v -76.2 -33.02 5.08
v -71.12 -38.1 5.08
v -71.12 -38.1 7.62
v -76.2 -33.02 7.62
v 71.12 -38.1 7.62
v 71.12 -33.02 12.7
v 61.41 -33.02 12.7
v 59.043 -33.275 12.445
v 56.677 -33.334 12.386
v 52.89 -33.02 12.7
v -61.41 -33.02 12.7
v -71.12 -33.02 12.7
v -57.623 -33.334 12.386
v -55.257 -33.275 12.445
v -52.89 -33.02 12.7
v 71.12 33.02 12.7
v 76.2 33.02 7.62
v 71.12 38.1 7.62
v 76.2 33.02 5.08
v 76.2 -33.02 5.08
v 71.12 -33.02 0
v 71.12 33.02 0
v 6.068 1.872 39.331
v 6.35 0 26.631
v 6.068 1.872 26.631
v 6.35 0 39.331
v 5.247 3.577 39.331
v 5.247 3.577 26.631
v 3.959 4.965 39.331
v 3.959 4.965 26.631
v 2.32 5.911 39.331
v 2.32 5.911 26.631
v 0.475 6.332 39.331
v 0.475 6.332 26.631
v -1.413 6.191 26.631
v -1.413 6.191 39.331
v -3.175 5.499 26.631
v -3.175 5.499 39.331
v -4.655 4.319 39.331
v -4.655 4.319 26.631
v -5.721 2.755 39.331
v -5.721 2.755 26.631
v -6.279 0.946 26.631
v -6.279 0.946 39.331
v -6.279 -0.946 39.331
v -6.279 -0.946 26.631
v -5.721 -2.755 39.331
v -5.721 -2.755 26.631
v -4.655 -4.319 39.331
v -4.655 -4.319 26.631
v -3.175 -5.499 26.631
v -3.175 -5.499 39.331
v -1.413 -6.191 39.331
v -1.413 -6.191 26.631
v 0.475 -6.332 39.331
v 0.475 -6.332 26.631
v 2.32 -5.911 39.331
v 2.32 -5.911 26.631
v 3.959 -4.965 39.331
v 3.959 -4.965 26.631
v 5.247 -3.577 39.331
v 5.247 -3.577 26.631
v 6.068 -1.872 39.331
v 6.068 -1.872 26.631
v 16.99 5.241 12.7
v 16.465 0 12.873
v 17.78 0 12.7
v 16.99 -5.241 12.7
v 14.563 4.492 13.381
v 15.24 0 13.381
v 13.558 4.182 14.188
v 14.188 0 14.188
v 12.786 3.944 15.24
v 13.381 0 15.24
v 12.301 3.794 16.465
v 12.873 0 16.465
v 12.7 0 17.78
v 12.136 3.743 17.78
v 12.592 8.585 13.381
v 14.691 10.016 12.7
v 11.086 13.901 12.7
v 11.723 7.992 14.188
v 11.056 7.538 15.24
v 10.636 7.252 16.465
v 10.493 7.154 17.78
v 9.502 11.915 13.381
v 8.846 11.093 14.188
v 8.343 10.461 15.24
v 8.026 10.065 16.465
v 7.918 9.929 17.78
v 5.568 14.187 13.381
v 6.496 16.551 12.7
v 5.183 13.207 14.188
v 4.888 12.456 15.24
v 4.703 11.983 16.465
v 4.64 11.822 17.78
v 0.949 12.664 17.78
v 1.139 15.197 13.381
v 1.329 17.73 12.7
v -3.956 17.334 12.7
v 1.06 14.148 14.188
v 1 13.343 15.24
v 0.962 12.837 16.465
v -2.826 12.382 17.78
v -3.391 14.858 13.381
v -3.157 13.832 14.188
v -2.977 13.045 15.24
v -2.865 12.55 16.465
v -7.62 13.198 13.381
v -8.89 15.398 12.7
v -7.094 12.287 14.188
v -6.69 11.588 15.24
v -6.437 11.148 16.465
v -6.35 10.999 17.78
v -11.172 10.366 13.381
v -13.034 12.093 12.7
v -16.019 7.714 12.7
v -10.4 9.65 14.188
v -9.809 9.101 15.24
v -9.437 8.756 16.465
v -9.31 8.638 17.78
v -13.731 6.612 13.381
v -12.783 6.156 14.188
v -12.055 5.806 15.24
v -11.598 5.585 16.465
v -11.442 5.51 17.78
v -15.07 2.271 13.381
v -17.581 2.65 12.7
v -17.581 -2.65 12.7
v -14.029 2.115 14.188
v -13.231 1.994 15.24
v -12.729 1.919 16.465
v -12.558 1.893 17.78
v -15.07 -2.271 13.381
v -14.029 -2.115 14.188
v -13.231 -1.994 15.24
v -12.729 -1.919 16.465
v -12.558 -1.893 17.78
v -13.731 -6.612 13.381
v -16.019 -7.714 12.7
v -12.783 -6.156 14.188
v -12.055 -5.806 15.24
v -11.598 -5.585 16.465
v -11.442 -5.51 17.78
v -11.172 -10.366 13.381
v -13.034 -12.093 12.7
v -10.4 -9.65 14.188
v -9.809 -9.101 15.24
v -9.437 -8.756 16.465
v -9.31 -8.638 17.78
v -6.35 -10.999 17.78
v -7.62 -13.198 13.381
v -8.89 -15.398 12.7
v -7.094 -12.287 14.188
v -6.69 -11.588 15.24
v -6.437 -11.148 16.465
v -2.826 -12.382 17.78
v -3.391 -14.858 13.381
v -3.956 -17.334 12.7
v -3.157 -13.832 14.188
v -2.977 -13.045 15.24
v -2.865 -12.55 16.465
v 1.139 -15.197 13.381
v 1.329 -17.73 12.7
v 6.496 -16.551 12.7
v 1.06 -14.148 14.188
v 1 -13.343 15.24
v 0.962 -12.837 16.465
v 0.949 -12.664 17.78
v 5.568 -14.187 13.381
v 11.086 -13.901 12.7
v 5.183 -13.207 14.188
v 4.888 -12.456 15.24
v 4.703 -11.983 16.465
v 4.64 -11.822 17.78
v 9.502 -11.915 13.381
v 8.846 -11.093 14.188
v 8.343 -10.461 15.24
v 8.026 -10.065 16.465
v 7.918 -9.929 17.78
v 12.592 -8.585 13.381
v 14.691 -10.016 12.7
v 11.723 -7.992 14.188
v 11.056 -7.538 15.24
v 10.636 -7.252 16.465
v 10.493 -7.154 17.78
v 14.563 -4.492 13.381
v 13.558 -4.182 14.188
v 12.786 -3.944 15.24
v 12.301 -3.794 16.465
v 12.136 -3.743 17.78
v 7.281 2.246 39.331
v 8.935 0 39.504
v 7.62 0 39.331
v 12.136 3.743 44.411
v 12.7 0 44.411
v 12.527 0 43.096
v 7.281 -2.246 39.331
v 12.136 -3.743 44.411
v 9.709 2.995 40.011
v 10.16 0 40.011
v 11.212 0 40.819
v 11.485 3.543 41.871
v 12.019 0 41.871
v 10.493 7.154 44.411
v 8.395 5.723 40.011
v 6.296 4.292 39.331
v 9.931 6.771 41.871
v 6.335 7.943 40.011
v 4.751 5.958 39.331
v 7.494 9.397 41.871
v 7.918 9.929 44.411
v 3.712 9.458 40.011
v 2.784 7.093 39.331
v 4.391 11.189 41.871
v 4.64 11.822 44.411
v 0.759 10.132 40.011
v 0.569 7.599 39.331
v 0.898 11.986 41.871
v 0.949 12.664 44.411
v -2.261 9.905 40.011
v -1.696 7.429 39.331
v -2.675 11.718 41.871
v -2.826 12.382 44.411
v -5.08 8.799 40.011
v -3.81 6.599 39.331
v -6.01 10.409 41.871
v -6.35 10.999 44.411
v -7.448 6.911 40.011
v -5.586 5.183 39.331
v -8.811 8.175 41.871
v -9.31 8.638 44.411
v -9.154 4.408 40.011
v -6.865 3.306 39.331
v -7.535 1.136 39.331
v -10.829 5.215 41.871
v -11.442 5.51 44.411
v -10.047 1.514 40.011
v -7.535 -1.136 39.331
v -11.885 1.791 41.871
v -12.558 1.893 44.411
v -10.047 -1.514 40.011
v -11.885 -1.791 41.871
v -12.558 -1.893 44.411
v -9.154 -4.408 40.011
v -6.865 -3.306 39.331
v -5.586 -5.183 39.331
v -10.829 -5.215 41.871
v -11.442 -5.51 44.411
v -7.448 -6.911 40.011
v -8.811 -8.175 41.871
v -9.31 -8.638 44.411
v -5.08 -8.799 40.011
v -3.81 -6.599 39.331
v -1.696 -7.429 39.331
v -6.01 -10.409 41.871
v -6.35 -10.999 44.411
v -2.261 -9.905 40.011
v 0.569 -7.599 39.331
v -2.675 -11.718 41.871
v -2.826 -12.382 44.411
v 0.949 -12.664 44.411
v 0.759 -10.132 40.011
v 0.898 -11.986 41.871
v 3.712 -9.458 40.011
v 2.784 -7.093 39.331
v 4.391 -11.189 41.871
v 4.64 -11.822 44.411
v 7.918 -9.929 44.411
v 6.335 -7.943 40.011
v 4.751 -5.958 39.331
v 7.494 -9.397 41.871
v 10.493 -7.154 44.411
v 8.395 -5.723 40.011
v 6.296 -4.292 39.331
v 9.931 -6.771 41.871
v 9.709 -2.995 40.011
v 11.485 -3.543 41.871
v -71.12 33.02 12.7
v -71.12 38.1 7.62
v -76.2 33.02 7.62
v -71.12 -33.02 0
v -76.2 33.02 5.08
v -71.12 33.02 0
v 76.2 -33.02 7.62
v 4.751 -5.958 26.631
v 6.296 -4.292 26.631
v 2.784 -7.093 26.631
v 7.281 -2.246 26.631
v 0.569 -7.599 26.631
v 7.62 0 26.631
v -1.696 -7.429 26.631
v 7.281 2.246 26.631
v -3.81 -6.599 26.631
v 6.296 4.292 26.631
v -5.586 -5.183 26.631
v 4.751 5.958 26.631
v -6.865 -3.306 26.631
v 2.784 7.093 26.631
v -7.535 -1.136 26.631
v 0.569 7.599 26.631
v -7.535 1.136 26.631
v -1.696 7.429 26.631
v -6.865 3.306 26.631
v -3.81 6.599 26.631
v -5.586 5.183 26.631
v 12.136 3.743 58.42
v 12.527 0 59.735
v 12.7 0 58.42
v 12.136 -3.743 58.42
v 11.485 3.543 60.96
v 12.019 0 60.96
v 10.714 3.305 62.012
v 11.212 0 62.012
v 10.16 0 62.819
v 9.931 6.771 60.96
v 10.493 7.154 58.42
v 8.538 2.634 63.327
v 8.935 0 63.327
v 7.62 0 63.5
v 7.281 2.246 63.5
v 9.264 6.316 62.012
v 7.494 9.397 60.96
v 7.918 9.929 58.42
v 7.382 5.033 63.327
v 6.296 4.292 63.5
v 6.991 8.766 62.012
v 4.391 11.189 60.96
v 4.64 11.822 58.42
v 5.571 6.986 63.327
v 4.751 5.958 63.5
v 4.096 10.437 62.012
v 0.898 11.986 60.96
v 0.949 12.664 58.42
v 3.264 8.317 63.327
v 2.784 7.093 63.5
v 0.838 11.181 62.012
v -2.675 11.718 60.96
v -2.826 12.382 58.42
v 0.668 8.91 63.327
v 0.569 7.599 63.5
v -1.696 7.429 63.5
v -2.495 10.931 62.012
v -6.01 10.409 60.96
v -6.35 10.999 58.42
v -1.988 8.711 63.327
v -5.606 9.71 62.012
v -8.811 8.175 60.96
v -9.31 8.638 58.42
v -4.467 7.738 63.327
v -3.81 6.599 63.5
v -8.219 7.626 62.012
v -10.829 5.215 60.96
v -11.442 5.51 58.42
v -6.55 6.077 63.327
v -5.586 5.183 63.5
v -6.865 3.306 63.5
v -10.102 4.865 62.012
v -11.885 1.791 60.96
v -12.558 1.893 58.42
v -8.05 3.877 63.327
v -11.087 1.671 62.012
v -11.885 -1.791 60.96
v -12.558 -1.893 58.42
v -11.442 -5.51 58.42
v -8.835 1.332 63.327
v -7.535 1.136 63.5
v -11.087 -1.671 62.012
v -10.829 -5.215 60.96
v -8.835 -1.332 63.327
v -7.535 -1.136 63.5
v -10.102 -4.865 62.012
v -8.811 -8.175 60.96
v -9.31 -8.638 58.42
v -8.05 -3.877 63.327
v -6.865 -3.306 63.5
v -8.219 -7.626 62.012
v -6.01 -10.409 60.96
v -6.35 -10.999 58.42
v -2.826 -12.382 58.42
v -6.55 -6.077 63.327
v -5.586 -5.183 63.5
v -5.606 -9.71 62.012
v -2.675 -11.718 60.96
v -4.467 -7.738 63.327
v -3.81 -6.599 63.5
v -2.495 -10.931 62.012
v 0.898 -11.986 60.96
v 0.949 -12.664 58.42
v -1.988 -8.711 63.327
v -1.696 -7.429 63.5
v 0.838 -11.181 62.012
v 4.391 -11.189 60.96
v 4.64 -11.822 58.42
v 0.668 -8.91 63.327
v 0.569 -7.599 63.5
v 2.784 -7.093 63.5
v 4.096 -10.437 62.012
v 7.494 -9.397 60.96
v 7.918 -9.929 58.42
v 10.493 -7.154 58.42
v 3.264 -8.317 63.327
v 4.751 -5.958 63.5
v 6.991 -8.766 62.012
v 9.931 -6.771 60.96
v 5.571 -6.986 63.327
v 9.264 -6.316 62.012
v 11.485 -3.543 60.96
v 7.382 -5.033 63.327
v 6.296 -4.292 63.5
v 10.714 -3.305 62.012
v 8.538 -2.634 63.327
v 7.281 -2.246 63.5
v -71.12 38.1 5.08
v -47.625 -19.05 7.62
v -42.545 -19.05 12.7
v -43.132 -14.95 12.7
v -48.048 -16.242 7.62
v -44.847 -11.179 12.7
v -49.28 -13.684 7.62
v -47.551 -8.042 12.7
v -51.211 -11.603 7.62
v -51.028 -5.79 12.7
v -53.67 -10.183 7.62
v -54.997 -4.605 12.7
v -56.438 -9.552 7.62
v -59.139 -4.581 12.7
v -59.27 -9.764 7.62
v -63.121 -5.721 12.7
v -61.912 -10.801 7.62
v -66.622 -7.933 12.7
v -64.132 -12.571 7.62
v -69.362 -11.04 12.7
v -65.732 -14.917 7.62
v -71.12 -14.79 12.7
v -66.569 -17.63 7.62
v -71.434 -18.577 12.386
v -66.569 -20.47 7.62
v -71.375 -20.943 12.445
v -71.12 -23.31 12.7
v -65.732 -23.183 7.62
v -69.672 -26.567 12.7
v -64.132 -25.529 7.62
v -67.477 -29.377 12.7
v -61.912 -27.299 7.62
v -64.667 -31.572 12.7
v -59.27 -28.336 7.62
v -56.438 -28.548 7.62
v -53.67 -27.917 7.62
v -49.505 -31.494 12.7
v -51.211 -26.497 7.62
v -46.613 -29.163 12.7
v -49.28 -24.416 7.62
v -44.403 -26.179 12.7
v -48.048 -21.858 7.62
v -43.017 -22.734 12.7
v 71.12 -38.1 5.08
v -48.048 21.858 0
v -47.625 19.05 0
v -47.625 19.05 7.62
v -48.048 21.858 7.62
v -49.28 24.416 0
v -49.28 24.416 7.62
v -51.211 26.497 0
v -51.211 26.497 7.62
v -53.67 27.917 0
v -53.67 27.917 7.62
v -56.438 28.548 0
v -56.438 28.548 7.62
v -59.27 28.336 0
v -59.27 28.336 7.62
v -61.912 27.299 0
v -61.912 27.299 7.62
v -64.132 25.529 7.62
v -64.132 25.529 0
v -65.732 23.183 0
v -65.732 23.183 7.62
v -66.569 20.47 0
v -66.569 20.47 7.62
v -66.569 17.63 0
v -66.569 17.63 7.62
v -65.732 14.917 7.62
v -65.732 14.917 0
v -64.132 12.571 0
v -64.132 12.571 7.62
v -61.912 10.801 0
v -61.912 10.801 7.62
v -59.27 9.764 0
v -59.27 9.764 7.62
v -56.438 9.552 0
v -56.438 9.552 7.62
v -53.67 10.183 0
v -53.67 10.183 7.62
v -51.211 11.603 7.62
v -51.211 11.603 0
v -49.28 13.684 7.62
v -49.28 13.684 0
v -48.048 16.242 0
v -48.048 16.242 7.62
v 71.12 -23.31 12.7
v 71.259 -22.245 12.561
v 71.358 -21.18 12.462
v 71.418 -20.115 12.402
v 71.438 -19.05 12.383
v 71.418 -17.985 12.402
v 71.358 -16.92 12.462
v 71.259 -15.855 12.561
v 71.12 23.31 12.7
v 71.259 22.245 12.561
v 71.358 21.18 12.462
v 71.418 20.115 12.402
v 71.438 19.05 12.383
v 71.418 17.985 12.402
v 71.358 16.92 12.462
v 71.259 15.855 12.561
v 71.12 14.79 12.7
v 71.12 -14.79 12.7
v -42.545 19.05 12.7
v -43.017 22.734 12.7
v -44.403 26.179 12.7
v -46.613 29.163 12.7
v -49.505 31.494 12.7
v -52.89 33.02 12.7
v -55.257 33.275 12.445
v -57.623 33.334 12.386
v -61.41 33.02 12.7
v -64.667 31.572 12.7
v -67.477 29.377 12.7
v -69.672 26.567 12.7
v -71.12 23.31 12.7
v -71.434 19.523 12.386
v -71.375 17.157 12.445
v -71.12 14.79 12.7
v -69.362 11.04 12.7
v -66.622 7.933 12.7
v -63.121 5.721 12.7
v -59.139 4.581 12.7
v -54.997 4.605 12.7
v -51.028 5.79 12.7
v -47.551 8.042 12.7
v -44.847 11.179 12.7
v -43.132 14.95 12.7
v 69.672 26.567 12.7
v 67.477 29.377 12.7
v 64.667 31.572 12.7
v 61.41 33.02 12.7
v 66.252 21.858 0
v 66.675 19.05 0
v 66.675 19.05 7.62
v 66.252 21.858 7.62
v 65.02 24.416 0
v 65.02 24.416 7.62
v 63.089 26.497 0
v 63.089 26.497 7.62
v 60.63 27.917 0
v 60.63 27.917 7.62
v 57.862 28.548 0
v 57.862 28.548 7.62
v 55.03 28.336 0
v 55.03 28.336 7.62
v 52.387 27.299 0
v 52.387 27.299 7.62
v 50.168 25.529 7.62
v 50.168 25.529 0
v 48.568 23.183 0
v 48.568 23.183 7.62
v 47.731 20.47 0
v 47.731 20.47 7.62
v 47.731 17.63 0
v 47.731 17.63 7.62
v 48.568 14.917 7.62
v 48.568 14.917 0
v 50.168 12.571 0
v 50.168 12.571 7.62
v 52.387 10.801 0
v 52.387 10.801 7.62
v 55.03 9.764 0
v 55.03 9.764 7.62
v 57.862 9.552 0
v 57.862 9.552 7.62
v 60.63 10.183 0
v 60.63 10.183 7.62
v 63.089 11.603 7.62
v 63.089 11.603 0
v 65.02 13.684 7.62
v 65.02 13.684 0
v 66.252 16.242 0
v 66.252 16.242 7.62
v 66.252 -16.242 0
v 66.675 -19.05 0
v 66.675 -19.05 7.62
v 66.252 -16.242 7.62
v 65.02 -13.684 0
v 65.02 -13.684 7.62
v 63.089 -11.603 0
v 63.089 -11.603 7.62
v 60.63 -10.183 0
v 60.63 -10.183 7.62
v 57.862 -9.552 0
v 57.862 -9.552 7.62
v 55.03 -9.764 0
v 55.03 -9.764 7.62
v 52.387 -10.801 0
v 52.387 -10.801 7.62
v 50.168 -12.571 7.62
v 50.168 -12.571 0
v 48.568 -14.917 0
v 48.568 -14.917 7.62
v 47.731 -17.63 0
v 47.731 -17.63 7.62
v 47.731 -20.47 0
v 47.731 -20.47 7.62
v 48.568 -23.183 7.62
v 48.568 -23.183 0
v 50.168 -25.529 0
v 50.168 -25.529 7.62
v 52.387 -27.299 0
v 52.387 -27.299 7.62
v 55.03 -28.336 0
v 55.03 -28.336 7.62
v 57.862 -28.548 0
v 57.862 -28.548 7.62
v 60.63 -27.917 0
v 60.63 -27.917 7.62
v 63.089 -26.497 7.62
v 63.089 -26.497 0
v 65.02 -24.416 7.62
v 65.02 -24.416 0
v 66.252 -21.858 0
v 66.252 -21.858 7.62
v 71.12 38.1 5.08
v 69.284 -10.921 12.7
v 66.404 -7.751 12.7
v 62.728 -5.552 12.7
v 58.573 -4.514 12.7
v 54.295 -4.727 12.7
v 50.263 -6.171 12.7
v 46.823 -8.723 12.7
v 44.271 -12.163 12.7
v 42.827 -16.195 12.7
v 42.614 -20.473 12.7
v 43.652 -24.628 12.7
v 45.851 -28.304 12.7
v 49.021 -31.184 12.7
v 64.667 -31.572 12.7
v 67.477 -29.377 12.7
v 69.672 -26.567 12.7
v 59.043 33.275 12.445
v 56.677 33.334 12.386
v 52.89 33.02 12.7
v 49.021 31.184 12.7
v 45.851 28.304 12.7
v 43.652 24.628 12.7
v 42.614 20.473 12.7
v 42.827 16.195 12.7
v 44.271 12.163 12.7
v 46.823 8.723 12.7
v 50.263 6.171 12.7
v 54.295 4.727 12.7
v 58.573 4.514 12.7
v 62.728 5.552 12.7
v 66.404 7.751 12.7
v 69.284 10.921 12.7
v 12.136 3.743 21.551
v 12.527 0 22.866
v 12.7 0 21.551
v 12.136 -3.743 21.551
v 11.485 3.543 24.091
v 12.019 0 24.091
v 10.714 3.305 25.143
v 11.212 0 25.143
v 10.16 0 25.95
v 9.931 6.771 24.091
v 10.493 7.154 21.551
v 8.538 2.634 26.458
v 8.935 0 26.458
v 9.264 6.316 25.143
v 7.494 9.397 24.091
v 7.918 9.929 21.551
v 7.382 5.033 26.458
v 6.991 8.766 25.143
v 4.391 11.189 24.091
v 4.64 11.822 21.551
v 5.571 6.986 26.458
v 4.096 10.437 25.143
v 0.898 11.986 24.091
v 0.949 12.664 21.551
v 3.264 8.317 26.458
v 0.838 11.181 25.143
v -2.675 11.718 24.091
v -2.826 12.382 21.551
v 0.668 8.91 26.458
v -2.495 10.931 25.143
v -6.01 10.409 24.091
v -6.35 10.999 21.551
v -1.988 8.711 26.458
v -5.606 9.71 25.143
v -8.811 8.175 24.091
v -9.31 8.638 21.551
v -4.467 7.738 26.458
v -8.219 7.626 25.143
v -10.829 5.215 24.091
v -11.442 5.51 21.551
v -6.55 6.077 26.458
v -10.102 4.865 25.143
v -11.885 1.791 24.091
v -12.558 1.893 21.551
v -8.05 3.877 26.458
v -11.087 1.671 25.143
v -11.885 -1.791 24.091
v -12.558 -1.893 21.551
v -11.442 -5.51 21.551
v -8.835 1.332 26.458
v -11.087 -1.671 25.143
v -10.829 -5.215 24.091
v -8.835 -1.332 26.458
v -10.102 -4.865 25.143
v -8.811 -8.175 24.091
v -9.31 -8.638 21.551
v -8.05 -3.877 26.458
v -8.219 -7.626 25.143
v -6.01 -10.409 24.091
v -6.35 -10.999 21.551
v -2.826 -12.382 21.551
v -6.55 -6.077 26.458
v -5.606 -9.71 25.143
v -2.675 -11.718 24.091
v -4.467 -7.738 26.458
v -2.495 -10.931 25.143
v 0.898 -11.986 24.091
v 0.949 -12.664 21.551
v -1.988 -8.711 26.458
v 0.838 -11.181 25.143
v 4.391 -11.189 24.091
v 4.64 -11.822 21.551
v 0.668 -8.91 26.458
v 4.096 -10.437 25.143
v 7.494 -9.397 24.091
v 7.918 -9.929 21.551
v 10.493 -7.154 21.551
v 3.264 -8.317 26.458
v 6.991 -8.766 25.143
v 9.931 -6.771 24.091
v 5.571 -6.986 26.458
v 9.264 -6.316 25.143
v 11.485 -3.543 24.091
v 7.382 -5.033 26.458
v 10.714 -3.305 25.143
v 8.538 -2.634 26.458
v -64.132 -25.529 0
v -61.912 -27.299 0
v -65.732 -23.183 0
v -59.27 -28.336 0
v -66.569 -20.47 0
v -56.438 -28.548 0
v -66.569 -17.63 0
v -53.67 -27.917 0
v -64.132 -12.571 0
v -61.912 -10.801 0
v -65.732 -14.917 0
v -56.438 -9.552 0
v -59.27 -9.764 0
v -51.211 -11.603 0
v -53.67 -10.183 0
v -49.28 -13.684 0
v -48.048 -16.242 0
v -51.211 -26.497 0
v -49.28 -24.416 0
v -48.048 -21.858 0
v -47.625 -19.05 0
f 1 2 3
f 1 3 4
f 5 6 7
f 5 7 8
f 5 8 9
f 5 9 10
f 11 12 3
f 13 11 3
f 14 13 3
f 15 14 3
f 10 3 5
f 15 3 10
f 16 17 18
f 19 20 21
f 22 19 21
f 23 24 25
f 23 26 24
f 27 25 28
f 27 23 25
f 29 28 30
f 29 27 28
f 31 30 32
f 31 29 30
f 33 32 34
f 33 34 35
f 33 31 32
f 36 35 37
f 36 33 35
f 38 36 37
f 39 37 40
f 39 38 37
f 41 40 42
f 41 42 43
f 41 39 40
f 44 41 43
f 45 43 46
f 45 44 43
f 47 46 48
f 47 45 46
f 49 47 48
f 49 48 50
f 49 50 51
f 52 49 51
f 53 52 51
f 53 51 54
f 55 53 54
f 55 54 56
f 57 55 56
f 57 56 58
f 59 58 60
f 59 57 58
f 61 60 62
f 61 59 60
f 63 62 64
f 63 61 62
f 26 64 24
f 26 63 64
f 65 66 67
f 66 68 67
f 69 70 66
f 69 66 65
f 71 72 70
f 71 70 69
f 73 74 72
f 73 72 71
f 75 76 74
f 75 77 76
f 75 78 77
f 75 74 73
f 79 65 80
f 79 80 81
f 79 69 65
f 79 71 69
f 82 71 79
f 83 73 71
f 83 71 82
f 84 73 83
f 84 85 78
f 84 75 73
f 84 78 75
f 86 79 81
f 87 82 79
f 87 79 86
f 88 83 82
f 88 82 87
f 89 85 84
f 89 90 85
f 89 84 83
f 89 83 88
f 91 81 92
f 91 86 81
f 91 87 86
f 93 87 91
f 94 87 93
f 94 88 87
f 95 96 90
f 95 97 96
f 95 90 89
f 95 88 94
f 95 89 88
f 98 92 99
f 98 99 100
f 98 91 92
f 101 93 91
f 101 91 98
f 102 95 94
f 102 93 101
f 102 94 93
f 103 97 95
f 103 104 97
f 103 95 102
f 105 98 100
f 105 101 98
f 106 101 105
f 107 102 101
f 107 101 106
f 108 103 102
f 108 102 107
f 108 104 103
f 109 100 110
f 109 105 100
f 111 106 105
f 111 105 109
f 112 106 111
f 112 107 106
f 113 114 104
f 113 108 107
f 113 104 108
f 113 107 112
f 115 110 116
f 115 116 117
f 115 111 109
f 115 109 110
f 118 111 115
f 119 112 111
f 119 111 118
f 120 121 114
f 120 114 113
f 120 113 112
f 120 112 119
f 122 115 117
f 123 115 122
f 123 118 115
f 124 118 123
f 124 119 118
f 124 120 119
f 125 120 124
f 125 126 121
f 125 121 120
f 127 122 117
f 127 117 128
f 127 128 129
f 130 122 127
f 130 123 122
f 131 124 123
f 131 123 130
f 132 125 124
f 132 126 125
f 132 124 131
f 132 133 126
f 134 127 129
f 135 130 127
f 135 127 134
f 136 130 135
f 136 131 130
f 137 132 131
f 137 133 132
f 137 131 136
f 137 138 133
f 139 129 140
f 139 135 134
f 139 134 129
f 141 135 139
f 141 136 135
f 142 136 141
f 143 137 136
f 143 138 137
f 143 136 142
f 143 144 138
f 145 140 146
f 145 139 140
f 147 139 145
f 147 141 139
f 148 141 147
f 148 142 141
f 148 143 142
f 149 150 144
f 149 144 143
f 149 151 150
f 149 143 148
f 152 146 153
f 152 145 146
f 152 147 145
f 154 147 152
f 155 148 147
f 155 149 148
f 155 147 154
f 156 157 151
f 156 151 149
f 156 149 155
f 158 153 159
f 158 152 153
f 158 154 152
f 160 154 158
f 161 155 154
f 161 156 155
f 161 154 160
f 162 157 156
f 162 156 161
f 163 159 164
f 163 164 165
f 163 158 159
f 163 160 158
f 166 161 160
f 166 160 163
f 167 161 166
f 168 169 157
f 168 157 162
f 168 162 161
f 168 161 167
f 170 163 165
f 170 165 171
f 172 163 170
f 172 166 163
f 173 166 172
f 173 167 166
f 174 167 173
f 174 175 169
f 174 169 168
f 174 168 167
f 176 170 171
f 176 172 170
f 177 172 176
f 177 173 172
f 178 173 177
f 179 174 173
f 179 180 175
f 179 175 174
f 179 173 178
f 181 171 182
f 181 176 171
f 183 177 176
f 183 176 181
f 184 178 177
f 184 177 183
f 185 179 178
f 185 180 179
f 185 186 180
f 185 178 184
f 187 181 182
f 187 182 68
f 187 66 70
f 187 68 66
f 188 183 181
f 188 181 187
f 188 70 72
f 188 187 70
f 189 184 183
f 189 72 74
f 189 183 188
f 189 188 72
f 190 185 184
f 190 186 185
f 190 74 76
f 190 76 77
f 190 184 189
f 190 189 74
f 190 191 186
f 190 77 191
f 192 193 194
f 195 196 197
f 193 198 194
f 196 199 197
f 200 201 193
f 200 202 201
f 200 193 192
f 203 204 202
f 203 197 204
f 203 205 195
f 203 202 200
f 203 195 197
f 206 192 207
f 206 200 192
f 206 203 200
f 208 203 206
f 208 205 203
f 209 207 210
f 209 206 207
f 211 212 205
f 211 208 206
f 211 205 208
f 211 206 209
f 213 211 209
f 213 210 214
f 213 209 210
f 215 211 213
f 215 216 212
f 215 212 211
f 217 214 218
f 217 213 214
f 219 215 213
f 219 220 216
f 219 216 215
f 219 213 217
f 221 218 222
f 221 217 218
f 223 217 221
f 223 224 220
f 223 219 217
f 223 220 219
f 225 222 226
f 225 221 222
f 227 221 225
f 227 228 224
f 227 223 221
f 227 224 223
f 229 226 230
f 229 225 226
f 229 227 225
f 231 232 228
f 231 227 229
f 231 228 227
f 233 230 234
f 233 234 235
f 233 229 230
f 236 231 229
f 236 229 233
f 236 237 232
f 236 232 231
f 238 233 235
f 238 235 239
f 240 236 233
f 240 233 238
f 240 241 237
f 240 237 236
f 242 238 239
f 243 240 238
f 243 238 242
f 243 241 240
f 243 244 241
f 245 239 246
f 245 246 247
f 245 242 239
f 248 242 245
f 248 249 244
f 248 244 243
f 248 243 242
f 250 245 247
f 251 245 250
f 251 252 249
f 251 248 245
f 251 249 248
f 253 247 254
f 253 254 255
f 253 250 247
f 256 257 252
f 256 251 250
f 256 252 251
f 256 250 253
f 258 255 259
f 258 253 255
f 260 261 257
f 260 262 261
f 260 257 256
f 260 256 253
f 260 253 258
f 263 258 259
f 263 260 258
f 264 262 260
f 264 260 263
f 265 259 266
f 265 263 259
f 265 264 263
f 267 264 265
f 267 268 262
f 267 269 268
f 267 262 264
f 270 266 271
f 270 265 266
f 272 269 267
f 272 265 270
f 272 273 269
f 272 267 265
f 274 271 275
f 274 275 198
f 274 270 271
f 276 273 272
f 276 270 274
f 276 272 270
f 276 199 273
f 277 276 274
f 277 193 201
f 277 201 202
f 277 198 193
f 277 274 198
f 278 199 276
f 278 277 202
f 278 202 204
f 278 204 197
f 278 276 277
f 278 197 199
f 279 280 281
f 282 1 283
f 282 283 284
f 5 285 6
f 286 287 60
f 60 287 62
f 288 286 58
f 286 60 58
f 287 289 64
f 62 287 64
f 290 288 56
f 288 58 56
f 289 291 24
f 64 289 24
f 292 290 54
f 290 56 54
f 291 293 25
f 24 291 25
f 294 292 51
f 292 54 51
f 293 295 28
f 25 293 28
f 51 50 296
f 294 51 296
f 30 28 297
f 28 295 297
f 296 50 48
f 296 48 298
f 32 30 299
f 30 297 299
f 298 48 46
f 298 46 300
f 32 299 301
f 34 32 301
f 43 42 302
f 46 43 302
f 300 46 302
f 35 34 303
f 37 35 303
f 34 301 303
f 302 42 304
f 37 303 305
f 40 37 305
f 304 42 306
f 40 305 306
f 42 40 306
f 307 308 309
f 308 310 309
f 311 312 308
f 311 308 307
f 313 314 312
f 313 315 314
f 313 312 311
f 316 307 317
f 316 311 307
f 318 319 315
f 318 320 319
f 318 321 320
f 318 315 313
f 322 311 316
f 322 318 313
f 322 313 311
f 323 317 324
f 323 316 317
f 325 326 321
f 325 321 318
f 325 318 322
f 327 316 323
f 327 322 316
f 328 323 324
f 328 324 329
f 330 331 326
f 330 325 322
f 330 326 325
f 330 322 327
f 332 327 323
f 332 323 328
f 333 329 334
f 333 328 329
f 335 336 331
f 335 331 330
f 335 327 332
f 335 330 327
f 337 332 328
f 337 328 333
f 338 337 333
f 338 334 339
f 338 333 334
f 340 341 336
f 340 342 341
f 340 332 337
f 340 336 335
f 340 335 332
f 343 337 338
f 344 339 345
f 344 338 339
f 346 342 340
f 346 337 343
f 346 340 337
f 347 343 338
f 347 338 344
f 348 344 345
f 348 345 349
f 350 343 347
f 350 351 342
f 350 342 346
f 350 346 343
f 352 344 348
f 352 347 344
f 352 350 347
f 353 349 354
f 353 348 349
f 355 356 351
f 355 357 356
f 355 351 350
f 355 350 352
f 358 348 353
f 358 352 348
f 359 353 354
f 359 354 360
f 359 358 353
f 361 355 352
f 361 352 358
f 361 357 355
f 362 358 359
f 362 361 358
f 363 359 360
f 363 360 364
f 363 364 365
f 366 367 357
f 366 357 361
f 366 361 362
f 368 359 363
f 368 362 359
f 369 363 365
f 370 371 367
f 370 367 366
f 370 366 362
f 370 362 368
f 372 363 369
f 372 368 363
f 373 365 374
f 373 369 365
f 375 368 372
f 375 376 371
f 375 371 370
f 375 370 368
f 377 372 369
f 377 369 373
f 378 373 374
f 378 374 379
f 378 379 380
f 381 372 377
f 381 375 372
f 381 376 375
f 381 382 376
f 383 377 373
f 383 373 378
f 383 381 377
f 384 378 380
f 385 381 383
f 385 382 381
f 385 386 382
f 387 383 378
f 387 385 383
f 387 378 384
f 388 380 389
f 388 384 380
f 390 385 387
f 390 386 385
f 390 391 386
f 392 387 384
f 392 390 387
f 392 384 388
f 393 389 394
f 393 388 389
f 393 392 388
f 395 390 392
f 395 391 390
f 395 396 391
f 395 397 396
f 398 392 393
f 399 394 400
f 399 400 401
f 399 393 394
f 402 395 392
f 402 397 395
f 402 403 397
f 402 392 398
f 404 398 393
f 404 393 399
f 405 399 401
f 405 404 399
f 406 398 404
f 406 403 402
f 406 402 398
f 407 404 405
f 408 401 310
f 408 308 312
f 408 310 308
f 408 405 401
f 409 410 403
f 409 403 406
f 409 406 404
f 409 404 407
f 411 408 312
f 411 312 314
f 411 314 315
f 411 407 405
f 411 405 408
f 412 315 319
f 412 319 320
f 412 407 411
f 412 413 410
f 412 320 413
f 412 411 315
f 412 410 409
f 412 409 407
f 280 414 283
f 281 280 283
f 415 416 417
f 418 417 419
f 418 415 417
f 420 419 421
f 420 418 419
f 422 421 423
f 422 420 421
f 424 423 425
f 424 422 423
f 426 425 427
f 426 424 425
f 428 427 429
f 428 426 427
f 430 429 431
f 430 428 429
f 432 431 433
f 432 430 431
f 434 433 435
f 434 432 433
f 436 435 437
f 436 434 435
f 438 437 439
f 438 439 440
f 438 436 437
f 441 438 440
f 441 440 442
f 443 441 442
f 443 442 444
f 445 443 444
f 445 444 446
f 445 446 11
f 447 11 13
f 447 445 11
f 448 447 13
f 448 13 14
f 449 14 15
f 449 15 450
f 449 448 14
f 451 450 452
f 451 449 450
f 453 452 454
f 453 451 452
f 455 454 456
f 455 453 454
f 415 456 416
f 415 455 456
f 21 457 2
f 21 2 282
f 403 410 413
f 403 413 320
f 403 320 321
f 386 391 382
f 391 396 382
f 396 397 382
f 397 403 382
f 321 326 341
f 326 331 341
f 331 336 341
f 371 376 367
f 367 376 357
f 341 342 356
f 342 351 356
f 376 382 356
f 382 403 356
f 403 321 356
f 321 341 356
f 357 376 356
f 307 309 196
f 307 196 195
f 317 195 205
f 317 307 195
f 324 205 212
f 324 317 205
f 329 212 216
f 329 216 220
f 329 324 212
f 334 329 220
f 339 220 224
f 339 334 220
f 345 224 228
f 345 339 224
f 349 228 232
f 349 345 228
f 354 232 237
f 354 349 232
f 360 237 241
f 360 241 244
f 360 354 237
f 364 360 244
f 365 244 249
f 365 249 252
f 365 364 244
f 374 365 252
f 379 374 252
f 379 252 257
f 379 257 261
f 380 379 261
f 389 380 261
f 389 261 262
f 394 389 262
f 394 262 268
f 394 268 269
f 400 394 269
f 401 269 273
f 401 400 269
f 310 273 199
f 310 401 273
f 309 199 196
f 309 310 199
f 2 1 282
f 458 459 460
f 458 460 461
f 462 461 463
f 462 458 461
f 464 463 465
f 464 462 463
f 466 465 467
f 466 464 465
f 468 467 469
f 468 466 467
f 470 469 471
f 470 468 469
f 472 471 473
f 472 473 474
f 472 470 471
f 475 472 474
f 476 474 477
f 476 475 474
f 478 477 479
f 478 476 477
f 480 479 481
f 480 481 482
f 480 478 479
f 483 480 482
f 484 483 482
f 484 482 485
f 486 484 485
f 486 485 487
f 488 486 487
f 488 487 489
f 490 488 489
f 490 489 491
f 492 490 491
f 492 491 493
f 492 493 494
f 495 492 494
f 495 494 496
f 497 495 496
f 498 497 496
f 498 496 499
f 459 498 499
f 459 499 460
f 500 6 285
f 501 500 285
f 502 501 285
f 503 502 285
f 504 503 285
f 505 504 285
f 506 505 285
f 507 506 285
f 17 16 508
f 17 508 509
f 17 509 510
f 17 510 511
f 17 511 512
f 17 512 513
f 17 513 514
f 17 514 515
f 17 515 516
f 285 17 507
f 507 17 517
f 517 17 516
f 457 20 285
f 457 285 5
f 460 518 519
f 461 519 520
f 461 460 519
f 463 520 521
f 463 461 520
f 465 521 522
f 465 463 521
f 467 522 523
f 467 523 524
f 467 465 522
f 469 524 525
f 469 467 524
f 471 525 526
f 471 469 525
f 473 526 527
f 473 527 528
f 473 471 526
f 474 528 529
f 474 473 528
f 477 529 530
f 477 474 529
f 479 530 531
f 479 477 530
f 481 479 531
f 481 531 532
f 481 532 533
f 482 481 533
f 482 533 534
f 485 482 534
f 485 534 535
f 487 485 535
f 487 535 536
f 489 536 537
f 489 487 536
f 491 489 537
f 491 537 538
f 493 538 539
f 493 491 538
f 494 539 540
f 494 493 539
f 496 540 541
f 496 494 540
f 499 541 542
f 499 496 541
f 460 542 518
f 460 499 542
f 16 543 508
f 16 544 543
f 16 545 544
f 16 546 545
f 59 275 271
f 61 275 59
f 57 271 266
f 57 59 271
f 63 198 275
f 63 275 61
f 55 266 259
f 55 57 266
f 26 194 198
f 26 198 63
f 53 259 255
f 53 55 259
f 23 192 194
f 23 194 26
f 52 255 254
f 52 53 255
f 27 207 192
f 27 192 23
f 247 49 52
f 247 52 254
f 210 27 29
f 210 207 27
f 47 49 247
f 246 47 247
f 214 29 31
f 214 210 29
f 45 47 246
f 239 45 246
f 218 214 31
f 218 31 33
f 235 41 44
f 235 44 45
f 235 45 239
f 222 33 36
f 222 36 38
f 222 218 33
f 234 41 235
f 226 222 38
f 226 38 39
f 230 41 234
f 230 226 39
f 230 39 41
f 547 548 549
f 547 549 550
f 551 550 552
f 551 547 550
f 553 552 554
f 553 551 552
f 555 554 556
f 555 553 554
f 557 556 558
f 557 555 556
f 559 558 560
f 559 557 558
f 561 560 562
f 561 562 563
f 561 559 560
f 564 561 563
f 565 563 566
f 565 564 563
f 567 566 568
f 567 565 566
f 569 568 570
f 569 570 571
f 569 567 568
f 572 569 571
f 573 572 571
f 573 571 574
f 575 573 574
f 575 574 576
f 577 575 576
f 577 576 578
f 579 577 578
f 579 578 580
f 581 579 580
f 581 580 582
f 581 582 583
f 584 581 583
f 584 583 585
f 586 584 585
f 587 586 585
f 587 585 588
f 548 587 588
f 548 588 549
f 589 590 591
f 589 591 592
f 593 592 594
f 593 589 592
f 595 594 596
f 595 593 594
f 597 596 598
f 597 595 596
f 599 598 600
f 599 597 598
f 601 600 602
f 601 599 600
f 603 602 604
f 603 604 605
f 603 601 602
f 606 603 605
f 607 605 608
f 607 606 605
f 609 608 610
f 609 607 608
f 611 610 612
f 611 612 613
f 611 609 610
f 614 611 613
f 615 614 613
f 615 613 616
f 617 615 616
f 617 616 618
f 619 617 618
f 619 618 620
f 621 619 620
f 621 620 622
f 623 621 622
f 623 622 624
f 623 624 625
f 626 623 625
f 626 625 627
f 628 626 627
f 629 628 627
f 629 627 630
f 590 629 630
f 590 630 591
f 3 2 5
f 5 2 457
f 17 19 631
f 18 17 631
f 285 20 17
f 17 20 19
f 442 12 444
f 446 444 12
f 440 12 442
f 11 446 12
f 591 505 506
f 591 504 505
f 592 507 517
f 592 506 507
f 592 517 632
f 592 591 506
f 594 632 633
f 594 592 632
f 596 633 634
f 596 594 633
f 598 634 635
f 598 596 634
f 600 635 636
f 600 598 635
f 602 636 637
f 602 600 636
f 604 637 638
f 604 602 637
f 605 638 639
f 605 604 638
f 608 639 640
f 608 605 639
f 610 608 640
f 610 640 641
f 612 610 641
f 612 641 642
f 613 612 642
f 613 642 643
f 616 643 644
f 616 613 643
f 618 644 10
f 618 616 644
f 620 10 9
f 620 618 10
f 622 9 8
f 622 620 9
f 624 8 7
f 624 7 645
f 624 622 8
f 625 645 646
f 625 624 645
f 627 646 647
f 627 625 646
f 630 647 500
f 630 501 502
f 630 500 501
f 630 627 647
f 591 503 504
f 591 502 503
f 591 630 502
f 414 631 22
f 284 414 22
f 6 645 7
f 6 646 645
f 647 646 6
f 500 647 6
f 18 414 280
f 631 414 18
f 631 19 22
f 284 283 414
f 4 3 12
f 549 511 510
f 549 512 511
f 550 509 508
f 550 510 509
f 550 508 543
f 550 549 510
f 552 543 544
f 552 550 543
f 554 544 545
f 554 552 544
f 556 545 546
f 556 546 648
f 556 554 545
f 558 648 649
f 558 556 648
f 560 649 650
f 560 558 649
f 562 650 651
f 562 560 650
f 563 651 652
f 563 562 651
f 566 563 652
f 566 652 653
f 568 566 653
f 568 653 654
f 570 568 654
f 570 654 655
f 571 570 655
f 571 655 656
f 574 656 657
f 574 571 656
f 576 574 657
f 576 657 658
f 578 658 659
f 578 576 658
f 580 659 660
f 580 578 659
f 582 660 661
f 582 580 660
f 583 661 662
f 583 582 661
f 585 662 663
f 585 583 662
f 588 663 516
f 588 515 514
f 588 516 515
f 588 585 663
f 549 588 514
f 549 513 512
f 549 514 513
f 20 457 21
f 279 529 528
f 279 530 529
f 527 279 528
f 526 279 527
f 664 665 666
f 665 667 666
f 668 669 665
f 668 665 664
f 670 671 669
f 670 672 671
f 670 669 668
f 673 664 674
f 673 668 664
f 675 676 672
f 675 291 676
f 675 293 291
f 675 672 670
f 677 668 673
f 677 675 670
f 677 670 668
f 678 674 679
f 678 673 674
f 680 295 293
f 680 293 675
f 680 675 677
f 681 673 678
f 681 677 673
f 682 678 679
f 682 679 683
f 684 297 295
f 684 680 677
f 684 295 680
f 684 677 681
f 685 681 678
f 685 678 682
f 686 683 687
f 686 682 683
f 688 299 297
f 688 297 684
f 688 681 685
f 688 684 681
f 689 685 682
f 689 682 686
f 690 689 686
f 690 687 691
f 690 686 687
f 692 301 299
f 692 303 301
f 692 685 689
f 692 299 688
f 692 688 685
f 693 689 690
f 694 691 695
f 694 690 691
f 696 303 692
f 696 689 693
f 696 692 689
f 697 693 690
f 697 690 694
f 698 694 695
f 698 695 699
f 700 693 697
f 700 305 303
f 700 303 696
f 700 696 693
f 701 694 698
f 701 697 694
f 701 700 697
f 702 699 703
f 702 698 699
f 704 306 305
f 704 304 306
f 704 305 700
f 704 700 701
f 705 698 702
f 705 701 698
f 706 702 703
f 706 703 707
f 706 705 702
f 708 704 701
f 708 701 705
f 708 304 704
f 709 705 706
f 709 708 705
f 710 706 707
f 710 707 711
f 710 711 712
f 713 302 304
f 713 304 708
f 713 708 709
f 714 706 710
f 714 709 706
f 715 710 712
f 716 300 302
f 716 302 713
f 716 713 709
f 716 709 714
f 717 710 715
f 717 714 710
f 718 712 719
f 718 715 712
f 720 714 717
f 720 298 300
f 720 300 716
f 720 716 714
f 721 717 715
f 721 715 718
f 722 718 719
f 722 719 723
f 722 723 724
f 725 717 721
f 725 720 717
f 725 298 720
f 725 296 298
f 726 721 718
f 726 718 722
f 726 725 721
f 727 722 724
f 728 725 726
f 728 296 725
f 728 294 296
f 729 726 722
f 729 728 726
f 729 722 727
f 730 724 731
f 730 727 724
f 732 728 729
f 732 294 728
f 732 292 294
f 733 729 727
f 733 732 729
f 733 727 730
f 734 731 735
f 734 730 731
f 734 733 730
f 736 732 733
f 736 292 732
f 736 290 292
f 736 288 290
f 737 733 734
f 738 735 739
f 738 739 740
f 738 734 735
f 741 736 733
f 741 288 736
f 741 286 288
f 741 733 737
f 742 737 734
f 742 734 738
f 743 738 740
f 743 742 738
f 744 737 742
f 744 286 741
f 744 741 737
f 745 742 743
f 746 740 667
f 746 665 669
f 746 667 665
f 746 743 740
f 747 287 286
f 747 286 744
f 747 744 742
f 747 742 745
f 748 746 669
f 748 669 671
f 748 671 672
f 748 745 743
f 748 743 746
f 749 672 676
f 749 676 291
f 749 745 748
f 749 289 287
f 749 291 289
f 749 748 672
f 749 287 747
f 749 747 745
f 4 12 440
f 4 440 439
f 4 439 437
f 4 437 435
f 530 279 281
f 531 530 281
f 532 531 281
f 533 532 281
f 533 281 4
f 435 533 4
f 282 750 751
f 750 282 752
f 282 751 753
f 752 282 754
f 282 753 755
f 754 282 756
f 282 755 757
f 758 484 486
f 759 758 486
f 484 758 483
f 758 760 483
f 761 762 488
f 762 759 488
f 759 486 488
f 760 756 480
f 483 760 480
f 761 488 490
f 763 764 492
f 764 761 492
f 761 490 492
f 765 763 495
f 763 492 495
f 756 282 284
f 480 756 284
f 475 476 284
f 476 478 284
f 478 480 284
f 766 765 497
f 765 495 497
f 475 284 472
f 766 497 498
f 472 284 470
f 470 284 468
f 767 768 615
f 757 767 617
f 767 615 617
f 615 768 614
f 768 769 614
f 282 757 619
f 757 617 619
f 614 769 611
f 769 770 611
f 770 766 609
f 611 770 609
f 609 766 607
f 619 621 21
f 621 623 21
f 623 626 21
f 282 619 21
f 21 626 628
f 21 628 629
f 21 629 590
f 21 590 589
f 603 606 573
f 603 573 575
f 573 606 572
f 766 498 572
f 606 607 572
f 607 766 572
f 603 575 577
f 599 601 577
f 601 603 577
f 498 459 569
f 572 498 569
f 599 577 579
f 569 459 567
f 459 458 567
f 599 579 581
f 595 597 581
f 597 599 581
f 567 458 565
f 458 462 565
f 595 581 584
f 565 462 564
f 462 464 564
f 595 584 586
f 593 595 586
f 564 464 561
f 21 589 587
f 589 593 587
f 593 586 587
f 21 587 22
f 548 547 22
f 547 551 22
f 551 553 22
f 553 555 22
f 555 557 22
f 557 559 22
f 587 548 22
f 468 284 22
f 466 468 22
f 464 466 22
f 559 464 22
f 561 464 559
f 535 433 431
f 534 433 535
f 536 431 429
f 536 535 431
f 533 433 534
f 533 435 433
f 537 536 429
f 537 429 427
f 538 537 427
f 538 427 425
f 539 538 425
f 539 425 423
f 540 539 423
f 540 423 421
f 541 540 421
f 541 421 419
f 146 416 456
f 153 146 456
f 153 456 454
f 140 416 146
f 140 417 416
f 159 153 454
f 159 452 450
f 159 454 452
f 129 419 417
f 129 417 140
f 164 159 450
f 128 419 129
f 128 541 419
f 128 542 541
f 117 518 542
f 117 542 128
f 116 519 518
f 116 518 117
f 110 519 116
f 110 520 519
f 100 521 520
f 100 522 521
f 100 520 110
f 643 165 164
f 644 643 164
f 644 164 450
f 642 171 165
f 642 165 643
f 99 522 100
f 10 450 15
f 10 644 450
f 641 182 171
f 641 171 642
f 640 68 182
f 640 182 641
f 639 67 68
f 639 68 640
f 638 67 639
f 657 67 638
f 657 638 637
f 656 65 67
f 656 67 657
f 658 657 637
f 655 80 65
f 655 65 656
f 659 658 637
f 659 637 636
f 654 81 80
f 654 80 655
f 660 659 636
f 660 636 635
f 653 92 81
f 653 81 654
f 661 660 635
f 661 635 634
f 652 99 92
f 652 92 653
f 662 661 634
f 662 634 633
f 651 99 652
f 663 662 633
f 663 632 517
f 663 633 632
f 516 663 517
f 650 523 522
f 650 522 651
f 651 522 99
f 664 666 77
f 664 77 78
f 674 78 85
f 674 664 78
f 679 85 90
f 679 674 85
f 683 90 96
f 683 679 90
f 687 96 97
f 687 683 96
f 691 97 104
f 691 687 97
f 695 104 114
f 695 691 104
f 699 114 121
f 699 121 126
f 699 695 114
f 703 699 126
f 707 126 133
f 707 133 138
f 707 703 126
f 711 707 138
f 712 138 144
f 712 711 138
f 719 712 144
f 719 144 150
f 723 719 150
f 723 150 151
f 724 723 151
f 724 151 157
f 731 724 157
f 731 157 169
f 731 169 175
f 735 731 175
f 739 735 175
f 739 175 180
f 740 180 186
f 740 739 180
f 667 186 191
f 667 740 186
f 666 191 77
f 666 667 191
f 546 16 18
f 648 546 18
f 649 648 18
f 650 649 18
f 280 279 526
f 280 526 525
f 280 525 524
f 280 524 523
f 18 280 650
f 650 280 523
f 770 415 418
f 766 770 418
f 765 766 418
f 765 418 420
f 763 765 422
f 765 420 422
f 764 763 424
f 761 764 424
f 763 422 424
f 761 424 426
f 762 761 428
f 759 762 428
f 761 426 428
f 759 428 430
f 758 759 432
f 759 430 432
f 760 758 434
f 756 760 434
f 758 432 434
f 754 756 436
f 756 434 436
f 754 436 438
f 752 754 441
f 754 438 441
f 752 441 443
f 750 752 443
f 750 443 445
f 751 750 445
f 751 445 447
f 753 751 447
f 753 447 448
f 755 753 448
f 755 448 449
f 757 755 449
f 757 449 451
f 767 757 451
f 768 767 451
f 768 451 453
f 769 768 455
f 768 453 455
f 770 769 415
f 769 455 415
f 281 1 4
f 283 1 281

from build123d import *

# Parameters (mm, degrees)
F0_W         = 152.4
F0_H         = 76.2
F1_DEPTH     = 12.7
F2_R         = 9.525
F3_DEPTH     = 12.7
F4_W         = 12.7
F4_H         = 50.8
F6_W         = 7.62
F6_H         = 12.7
F8_R         = 5.08
F9_T1_DEPTH  = 6.4524666085
F9_T3_DEPTH  = 6.4524666085
F9_T5_DEPTH  = 6.4524666085
F9_T7_DEPTH  = 6.4524666085
F9_T9_DEPTH  = 6.4524666085
F9_T11_DEPTH = 6.4524666085
F9_T13_DEPTH = 6.4524666085
F9_T15_DEPTH = 6.4524666085
F9_T17_DEPTH = 102.3282991577
F9_T19_DEPTH = 178.5282991577
F9_T21_DEPTH = 38.8282991577


# Not quite as in the source:
# - a fillet or chamfer that OpenCascade refuses, or shapes differently, is made with other operations: its cross-section is extruded or revolved along the edge and cut away or added


with BuildPart() as f1:
    # F0 (on Top) → F1 (new body)
    with BuildSketch(Plane.XY):
        Rectangle(F0_W, F0_H)
    extrude(amount=F1_DEPTH)

    # F2 (on Top) → F3 (cut, symmetric)
    with BuildSketch(Plane.XY):
        with Locations((-57.15, 19.05)):
            Circle(F2_R)
        with Locations((57.15, 19.05)):
            Circle(F2_R)
        with Locations((57.15, -19.05)):
            Circle(F2_R)
        with Locations((-57.15, -19.05)):
            Circle(F2_R)
    extrude(amount=F3_DEPTH, both=True, mode=Mode.SUBTRACT)

    # F4 (on Front) → F5 (revolve)
    with BuildSketch(Plane.XZ):
        with Locations((6.35, 38.1)):
            Rectangle(F4_W, F4_H)
    revolve(axis=Axis((0, 0, 38.1), (0, 0, 1)))

    # F6 (on Front) → F7 (revolve, cut)
    with BuildSketch(Plane.XZ):
        with Locations((10.16, 32.980889082)):
            Rectangle(F6_W, F6_H)
    revolve(axis=Axis((0, 0, 12.7), (0, 0, 1)), mode=Mode.SUBTRACT)

    # F8
    f8_edges = [f1.edges().sort_by_distance(p)[0] for p in [
        (-12.7, 0, 12.7),
        (-12.7, 0, 63.5),
        (-12.7, 0, 26.630889),
        (-12.7, 0, 39.330889),
    ]]
    fillet(f8_edges, radius=F8_R)

    # F9: chamfer of 5.08 on 17 edges, made by hand

    # F9_s2 → F9_t1 (cut)
    with BuildSketch(Plane(origin=(38.9466666667, -38.9466666667, 38.9466666667), x_dir=(0.7071067812, 0.7071067812, 0), z_dir=(0.5773502692, -0.5773502692, 0.5773502692))):
        Polygon((26.9407683632, -32.1454703911), (30.5328708116, -38.3671743378), (23.3486659148, -38.3671743378), align=None)
    extrude(amount=F9_T1_DEPTH, mode=Mode.SUBTRACT)

    # F9_s4 → F9_t3 (cut)
    with BuildSketch(Plane(origin=(38.9466666667, 38.9466666667, 38.9466666667), x_dir=(-0.7071067812, 0.7071067812, 0), z_dir=(0.5773502692, 0.5773502692, 0.5773502692))):
        Polygon((-26.9407683632, -32.1454703911), (-30.5328708116, -38.3671743378), (-23.3486659148, -38.3671743378), align=None)
    extrude(amount=F9_T3_DEPTH, mode=Mode.SUBTRACT)

    # F9_s6 → F9_t5 (cut)
    with BuildSketch(Plane(origin=(-38.9466666667, -38.9466666667, 38.9466666667), x_dir=(0.7071067812, -0.7071067812, 0), z_dir=(-0.5773502692, -0.5773502692, 0.5773502692))):
        Polygon((-26.9407683632, -32.1454703911), (-23.3486659148, -38.3671743378), (-30.5328708116, -38.3671743378), align=None)
    extrude(amount=F9_T5_DEPTH, mode=Mode.SUBTRACT)

    # F9_s8 → F9_t7 (cut)
    with BuildSketch(Plane(origin=(-38.9466666667, 38.9466666667, 38.9466666667), x_dir=(-0.7071067812, -0.7071067812, 0), z_dir=(-0.5773502692, 0.5773502692, 0.5773502692))):
        Polygon((26.9407683632, -32.1454703911), (23.3486659148, -38.3671743378), (30.5328708116, -38.3671743378), align=None)
    extrude(amount=F9_T7_DEPTH, mode=Mode.SUBTRACT)

    # F9_s10 → F9_t9 (cut)
    with BuildSketch(Plane(origin=(-34.7133333333, -34.7133333333, -34.7133333333), x_dir=(0.7071067812, -0.7071067812, 0), z_dir=(-0.5773502692, -0.5773502692, -0.5773502692))):
        Polygon((-26.9407683632, 42.5149769689), (-23.3486659148, 48.7366809156), (-30.5328708116, 48.7366809156), align=None)
    extrude(amount=F9_T9_DEPTH, mode=Mode.SUBTRACT)

    # F9_s12 → F9_t11 (cut)
    with BuildSketch(Plane(origin=(34.7133333333, -34.7133333333, -34.7133333333), x_dir=(0.7071067812, 0.7071067812, 0), z_dir=(0.5773502692, -0.5773502692, -0.5773502692))):
        Polygon((26.9407683632, 42.5149769689), (30.5328708116, 48.7366809156), (23.3486659148, 48.7366809156), align=None)
    extrude(amount=F9_T11_DEPTH, mode=Mode.SUBTRACT)

    # F9_s14 → F9_t13 (cut)
    with BuildSketch(Plane(origin=(34.7133333333, 34.7133333333, -34.7133333333), x_dir=(-0.7071067812, 0.7071067812, 0), z_dir=(0.5773502692, 0.5773502692, -0.5773502692))):
        Polygon((-30.5328708116, 48.7366809156), (-26.9407683632, 42.5149769689), (-23.3486659148, 48.7366809156), align=None)
    extrude(amount=F9_T13_DEPTH, mode=Mode.SUBTRACT)

    # F9_s16 → F9_t15 (cut)
    with BuildSketch(Plane(origin=(-34.7133333333, 34.7133333333, -34.7133333333), x_dir=(-0.7071067812, -0.7071067812, 0), z_dir=(-0.5773502692, 0.5773502692, -0.5773502692))):
        Polygon((26.9407683632, 42.5149769689), (23.3486659148, 48.7366809156), (30.5328708116, 48.7366809156), align=None)
    extrude(amount=F9_T15_DEPTH, mode=Mode.SUBTRACT)

    # F9_s18 → F9_t17 (cut)
    with BuildSketch(Plane.XZ.offset(-51.1641495789)):
        Polygon((71.12, 12.7), (76.2, 7.62), (76.2, 12.7), align=None)
        Polygon((-71.12, 12.7), (-76.2, 7.62), (-76.2, 12.7), align=None)
        Polygon((-76.2, 5.08), (-71.12, 0), (-76.2, 0), align=None)
        Polygon((76.2, 5.08), (71.12, 0), (76.2, 0), align=None)
    extrude(amount=F9_T17_DEPTH, mode=Mode.SUBTRACT)

    # F9_s20 → F9_t19 (cut)
    with BuildSketch(Plane.YZ.offset(-89.2641495789)):
        Polygon((-33.02, 12.7), (-38.1, 7.62), (-38.1, 12.7), align=None)
        Polygon((33.02, 12.7), (38.1, 7.62), (38.1, 12.7), align=None)
        Polygon((-38.1, 5.08), (-33.02, 0), (-38.1, 0), align=None)
        Polygon((38.1, 5.08), (33.02, 0), (38.1, 0), align=None)
    extrude(amount=F9_T19_DEPTH, mode=Mode.SUBTRACT)

    # F9_s22 → F9_t21 (cut)
    with BuildSketch(Plane.XY.offset(-13.0641495789)):
        Polygon((-71.12, 38.1), (-76.2, 33.02), (-76.2, 38.1), align=None)
        Polygon((-71.12, -38.1), (-76.2, -33.02), (-76.2, -38.1), align=None)
        Polygon((76.2, -33.02), (71.12, -38.1), (76.2, -38.1), align=None)
        Polygon((76.2, 33.02), (71.12, 38.1), (76.2, 38.1), align=None)
    extrude(amount=F9_T21_DEPTH, mode=Mode.SUBTRACT)

    # F9_s23 → F9_t24 (revolve, cut)
    with BuildSketch(Plane.XZ.offset(19.05)):
        Polygon((-42.545, 12.7), (-47.625, 7.62), (-47.625, 12.7), align=None)
    revolve(axis=Axis((-57.15, -19.05, 12.7), (0, 0, 1)), mode=Mode.SUBTRACT)

    # F9_s25 → F9_t26 (revolve, cut)
    with BuildSketch(Plane.XZ.offset(19.05)):
        Polygon((71.755, 12.7), (66.675, 7.62), (66.675, 12.7), align=None)
    revolve(axis=Axis((57.15, -19.05, 12.7), (0, 0, 1)), mode=Mode.SUBTRACT)

    # F9_s27 → F9_t28 (revolve, cut)
    with BuildSketch(Plane.XZ.offset(-19.05)):
        Polygon((-42.545, 12.7), (-47.625, 7.62), (-47.625, 12.7), align=None)
    revolve(axis=Axis((-57.15, 19.05, 12.7), (0, 0, 1)), mode=Mode.SUBTRACT)

    # F9_s29 → F9_t30 (revolve, cut)
    with BuildSketch(Plane.XZ.offset(-19.05)):
        Polygon((71.755, 12.7), (66.675, 7.62), (66.675, 12.7), align=None)
    revolve(axis=Axis((57.15, 19.05, 12.7), (0, 0, 1)), mode=Mode.SUBTRACT)


solid = f1.part
